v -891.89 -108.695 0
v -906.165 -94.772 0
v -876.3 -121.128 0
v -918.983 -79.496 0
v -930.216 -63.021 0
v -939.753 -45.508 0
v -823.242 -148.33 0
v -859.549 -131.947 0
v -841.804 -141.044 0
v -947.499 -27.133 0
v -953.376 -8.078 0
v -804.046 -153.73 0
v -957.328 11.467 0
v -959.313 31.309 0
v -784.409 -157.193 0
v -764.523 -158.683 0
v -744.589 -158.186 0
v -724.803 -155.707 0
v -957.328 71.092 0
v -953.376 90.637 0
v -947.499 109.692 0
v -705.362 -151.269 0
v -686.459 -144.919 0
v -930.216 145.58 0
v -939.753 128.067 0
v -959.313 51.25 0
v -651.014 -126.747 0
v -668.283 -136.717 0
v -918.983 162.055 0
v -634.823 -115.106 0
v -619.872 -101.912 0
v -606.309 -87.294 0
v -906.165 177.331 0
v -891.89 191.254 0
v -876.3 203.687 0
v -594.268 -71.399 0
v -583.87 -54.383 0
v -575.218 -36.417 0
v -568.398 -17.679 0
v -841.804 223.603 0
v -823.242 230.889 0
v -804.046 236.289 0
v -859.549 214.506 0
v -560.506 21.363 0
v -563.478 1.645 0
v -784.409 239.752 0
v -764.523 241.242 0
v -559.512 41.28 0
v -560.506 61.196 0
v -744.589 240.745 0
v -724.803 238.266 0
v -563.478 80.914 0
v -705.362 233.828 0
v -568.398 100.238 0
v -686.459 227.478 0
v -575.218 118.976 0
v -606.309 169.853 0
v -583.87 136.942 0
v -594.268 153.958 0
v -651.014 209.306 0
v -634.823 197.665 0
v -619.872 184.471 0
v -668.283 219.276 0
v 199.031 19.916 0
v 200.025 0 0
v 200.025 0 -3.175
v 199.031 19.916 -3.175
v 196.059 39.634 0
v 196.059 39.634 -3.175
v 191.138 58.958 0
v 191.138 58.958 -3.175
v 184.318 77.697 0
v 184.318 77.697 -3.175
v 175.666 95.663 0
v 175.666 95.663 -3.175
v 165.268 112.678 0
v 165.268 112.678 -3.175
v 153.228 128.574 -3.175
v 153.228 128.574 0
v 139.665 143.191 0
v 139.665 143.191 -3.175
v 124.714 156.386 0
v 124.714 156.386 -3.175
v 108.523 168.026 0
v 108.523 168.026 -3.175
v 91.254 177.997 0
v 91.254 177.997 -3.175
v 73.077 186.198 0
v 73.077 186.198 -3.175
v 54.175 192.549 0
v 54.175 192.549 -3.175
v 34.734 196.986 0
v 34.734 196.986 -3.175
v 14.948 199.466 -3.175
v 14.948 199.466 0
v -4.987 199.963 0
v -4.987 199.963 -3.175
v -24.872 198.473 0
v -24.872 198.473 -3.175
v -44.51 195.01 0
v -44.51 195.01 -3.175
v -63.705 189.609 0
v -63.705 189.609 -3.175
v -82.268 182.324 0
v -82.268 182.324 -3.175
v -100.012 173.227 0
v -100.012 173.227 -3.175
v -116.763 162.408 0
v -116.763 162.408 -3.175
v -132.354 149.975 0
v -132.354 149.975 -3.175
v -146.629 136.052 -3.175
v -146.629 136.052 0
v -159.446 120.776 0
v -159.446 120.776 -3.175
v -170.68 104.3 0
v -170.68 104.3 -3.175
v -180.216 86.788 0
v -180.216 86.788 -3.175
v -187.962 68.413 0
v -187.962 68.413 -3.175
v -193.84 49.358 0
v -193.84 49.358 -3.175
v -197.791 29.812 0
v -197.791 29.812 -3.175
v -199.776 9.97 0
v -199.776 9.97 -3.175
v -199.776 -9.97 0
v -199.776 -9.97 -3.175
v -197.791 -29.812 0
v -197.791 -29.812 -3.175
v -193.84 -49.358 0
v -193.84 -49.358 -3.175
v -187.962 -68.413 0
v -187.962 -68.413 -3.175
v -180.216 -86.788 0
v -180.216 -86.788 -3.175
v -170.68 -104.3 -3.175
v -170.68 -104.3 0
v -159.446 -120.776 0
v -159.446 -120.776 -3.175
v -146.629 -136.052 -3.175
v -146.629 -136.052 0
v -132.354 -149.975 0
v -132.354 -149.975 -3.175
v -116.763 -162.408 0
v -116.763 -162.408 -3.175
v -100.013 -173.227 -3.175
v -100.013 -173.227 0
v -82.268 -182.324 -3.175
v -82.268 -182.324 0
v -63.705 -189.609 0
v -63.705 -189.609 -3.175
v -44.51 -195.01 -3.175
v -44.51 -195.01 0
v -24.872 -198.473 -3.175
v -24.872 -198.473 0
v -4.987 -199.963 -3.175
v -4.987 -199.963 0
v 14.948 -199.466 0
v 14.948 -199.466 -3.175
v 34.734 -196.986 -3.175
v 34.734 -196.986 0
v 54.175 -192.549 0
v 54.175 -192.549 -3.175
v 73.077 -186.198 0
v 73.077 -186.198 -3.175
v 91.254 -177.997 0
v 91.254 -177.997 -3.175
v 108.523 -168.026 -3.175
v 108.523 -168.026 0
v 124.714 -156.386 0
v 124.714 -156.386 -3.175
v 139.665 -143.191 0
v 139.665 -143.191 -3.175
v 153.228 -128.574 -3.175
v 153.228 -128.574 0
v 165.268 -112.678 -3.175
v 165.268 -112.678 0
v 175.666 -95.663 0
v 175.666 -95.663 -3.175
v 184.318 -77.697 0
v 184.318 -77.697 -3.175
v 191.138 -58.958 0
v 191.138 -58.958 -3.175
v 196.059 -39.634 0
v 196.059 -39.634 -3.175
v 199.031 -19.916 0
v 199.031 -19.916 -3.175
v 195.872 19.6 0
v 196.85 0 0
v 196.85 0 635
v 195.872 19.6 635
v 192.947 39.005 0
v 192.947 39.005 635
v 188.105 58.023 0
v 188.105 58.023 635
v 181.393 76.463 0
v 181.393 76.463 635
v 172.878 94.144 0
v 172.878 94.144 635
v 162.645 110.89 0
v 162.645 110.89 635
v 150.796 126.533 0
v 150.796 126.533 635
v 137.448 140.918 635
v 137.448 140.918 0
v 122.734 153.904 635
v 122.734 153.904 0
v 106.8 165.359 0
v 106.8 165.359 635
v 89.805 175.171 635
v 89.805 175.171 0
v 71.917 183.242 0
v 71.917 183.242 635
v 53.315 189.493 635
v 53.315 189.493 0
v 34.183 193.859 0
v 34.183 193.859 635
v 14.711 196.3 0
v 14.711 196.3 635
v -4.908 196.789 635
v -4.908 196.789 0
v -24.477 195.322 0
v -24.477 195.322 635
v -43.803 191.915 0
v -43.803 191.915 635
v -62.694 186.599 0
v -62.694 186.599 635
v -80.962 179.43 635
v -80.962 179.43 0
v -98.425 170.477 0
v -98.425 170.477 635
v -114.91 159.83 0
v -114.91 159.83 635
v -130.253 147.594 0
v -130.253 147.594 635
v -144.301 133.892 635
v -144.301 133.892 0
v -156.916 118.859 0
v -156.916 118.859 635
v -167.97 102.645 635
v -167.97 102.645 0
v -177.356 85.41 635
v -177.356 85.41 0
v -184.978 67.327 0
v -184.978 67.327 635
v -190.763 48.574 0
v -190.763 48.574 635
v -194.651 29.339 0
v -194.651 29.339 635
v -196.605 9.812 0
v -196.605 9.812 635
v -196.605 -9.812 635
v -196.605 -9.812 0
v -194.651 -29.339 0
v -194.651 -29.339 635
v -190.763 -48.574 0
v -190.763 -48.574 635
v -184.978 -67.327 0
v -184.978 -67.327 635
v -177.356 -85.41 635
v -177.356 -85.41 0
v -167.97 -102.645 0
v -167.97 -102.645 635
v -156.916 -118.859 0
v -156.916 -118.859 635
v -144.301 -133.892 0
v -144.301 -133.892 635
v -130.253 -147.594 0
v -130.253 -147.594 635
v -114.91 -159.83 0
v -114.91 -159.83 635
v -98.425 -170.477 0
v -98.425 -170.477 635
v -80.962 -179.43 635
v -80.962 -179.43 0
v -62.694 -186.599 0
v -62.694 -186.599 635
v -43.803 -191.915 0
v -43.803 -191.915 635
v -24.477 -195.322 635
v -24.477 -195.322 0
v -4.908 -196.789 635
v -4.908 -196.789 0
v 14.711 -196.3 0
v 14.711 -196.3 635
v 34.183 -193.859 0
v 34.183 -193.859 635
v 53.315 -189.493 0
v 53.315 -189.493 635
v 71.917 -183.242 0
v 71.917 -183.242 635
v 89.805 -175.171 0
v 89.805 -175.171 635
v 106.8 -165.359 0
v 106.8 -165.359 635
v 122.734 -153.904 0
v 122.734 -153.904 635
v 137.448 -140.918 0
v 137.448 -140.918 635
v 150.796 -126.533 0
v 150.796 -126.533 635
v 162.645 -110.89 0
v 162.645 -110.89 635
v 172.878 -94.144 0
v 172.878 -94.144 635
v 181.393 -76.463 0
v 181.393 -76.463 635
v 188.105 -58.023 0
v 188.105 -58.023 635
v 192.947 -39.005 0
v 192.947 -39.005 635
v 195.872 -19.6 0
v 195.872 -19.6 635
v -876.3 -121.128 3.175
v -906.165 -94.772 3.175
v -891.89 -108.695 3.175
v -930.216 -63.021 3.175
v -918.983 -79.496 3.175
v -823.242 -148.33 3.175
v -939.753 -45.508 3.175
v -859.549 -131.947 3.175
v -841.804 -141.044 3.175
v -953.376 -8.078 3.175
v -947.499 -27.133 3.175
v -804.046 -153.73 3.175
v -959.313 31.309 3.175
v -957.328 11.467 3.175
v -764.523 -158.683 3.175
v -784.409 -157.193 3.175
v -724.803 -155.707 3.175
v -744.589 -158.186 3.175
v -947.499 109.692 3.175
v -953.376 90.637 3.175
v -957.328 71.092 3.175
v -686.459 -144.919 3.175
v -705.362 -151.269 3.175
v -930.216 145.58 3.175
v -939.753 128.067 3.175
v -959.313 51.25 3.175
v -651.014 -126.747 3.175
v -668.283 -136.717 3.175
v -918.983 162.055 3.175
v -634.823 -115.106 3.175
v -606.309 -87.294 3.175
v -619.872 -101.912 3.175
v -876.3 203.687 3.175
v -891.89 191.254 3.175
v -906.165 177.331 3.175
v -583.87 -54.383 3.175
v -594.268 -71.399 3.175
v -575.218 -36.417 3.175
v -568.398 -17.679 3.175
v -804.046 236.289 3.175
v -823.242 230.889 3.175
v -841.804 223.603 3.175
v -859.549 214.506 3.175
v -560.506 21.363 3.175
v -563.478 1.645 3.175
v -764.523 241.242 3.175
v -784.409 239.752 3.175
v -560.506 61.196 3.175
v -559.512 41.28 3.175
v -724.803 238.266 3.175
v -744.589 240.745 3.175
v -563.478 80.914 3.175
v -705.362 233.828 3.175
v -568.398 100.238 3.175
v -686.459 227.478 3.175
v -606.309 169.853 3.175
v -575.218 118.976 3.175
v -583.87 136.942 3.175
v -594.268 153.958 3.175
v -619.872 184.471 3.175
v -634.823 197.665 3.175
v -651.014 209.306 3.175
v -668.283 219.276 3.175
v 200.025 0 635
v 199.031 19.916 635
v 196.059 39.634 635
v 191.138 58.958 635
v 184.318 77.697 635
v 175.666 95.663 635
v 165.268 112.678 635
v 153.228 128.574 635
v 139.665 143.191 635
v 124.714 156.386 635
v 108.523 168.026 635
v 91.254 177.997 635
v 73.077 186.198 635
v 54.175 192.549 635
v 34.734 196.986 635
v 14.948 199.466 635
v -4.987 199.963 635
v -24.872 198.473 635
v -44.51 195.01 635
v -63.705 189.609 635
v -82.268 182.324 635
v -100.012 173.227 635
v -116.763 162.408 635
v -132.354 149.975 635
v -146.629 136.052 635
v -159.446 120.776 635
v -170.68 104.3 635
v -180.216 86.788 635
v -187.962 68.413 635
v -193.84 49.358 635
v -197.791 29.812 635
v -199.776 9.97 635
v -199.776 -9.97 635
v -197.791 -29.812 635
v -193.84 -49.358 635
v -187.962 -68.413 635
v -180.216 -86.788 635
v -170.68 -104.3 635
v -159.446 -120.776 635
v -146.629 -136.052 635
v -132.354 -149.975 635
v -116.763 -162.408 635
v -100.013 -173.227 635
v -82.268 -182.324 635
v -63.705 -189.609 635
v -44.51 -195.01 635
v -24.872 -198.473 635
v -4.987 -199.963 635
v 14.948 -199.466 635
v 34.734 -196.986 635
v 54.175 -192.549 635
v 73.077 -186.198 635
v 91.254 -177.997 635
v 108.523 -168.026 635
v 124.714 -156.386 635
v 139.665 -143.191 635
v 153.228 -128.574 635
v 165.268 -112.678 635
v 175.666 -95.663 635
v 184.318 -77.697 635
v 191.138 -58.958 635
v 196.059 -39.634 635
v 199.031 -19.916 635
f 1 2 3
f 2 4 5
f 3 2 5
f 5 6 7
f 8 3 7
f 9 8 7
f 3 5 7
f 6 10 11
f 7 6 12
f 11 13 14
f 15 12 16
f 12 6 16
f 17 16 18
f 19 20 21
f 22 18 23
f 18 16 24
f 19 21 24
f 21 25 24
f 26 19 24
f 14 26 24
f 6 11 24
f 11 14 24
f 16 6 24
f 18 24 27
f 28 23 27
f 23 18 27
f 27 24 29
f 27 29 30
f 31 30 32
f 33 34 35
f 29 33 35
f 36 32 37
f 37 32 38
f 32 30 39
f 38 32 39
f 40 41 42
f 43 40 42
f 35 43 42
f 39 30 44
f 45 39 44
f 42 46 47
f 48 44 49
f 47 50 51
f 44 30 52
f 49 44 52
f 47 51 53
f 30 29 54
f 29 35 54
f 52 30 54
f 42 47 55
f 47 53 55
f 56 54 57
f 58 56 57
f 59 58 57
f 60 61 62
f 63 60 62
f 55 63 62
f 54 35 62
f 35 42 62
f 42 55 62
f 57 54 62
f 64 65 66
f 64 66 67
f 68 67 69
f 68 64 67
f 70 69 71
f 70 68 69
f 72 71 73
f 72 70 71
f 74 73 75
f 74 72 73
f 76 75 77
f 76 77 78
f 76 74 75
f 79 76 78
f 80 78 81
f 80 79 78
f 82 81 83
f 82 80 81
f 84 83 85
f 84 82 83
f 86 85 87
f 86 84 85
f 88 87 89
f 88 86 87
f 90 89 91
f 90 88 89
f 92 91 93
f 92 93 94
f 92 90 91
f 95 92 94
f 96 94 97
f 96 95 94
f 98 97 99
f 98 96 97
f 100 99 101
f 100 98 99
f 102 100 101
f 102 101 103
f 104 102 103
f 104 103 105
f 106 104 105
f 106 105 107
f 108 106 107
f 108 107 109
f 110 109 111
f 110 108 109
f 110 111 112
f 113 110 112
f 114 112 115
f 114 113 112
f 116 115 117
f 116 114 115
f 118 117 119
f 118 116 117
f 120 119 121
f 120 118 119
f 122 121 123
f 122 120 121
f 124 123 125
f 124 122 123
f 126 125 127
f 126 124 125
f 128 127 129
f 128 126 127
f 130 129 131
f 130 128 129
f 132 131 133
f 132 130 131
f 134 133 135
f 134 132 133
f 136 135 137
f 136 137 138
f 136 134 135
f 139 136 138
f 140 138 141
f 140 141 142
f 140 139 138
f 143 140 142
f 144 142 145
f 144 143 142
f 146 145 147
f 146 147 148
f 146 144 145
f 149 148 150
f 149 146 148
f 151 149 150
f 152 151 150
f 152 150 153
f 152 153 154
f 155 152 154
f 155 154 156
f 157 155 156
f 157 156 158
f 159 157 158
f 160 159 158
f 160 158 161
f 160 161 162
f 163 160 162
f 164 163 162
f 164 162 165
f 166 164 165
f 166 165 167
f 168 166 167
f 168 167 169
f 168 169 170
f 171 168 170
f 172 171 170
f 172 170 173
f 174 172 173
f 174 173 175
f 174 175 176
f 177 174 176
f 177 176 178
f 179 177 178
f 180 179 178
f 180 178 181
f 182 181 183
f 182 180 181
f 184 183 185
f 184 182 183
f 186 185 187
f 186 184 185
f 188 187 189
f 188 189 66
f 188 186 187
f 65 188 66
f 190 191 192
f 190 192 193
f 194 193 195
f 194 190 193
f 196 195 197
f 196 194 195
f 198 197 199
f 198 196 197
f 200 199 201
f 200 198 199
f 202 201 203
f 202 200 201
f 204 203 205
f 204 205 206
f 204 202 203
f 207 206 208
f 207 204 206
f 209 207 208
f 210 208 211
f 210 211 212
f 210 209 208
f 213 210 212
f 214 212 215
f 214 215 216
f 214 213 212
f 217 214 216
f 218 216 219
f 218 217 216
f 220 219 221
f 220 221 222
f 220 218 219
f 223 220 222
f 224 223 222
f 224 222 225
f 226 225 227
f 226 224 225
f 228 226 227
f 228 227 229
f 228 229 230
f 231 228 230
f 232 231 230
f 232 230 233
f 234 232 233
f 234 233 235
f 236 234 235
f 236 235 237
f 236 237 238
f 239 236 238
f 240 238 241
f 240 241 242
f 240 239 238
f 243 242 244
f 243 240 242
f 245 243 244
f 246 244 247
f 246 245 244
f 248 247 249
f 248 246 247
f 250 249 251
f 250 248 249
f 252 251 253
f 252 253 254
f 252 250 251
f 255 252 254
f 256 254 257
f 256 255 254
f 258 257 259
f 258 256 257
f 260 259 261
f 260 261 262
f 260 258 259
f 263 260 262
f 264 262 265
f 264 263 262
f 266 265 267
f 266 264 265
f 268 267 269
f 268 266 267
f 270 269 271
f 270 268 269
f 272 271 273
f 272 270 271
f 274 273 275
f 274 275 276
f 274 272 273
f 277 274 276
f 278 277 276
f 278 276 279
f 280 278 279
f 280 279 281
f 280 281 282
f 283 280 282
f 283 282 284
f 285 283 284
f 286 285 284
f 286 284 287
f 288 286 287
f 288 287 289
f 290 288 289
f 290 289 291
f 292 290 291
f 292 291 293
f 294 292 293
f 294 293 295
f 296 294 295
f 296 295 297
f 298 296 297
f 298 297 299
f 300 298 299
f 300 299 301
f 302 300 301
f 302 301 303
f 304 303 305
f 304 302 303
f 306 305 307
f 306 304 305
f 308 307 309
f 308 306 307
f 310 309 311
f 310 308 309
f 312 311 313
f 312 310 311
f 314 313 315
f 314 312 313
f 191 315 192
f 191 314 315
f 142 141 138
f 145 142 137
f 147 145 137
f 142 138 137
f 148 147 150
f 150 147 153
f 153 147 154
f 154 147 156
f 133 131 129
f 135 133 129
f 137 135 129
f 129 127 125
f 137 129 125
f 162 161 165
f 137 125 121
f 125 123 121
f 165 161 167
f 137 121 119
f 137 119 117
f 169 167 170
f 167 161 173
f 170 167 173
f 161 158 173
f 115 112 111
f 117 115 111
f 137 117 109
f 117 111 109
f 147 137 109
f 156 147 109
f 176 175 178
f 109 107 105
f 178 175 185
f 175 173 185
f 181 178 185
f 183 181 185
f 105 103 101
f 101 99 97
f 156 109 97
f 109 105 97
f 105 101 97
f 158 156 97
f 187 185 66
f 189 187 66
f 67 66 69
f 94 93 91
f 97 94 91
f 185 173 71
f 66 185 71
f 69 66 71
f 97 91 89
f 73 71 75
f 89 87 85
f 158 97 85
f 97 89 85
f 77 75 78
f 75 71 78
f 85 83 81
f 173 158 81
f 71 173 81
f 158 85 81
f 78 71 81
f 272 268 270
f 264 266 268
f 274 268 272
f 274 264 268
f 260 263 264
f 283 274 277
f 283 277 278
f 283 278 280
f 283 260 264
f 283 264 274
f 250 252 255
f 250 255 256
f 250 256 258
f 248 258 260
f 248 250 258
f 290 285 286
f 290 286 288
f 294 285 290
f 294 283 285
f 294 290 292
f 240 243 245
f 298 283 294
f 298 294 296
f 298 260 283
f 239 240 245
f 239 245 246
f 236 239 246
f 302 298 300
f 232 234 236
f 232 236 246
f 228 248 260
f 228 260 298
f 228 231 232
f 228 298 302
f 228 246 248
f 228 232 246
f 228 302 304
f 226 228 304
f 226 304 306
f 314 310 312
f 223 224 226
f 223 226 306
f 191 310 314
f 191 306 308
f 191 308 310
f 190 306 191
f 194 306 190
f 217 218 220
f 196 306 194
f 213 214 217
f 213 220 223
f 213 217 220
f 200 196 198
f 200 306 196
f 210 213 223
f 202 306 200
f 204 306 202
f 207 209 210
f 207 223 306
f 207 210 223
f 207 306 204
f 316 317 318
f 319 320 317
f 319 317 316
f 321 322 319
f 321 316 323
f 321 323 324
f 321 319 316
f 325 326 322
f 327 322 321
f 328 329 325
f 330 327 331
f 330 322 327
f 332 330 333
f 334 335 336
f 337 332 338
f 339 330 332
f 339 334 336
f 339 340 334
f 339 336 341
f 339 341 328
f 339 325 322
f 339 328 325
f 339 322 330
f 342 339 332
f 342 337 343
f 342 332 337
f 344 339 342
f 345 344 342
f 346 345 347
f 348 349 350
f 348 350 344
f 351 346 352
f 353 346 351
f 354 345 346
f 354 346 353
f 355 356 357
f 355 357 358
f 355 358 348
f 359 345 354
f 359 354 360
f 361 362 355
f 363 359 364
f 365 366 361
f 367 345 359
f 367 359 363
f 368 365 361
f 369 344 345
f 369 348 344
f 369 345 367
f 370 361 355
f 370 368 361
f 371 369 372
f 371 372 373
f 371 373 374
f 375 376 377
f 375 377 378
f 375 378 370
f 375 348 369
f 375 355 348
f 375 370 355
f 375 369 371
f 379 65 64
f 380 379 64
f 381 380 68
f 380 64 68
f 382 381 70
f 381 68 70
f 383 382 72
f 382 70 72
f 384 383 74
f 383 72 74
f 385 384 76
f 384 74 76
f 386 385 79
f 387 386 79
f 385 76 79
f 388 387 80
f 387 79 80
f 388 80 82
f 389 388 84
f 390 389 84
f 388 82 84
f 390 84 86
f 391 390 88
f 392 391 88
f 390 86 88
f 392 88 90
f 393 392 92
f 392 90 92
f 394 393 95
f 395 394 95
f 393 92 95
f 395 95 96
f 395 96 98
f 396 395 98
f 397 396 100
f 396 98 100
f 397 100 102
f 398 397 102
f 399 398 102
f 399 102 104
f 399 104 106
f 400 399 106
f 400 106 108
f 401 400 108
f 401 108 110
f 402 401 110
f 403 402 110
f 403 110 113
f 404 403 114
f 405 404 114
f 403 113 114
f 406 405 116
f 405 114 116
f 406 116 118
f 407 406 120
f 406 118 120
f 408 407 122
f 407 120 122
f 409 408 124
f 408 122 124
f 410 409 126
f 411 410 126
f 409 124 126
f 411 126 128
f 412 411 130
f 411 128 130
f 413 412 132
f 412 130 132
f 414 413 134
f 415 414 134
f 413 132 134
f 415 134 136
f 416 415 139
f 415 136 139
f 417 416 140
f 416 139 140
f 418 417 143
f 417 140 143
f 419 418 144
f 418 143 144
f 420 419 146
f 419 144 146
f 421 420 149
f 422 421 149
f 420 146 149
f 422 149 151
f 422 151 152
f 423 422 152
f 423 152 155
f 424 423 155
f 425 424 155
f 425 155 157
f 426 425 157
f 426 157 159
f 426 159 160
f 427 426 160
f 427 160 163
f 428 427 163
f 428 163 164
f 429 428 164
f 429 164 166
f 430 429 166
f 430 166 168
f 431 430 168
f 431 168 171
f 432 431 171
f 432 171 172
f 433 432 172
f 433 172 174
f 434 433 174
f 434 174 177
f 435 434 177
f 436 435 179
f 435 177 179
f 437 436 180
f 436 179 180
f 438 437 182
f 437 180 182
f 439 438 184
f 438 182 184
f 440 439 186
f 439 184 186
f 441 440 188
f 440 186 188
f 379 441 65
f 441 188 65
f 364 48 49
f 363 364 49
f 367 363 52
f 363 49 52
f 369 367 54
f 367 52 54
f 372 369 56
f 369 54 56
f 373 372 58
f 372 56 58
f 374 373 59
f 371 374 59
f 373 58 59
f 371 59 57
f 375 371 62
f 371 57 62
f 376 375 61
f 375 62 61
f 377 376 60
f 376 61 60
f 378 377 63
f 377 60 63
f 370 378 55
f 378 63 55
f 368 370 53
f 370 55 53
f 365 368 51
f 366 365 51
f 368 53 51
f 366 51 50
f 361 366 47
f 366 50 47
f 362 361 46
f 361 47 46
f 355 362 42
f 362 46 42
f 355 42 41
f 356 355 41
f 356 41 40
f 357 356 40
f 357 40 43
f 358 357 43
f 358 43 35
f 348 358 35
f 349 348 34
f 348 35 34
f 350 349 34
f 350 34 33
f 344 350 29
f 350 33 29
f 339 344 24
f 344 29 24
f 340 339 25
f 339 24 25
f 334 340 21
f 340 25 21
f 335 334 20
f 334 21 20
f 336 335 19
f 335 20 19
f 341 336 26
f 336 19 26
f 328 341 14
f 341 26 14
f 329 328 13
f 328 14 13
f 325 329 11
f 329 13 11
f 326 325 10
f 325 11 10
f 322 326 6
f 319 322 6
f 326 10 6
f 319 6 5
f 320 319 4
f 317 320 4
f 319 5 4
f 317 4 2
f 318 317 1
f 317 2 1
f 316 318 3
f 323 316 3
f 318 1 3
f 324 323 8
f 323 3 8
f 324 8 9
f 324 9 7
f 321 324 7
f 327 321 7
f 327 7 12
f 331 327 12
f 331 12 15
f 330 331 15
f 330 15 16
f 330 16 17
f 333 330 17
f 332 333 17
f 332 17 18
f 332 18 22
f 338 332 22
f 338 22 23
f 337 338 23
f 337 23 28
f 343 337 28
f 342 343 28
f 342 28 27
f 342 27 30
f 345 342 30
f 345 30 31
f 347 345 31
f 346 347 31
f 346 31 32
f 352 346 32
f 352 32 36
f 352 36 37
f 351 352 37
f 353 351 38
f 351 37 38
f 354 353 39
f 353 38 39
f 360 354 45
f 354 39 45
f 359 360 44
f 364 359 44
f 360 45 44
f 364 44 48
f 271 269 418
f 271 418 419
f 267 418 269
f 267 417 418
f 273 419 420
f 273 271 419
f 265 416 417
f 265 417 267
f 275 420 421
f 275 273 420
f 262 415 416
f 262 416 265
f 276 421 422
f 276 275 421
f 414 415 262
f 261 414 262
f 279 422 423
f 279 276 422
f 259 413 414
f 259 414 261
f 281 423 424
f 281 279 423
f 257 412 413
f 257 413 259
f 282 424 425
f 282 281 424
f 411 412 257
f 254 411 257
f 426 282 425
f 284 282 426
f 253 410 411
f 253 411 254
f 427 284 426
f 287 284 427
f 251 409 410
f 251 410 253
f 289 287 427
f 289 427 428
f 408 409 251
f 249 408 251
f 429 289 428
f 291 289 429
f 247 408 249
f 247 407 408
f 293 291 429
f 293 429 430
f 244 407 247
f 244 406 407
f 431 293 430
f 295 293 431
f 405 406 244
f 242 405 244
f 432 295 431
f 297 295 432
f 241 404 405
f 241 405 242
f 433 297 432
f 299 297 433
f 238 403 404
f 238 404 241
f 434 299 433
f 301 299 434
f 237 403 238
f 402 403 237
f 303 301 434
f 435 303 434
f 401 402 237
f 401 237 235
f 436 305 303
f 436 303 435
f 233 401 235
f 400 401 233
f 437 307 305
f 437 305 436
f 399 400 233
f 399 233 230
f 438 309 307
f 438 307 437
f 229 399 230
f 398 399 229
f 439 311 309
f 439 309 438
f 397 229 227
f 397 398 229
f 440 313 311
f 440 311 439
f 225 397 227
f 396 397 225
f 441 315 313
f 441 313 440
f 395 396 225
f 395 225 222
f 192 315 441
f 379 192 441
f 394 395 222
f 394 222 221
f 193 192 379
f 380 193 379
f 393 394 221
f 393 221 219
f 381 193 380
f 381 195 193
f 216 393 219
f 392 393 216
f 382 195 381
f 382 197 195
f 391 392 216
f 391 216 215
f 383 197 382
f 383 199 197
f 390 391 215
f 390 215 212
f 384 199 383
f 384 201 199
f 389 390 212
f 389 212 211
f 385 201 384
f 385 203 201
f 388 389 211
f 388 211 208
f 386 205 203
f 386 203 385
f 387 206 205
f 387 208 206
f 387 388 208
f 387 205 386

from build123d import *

# Parameters (mm, degrees)
F0_R     = 200.025
F1_DEPTH = 3.175
F2_R     = 200.025
F2_R_2   = 196.85
F3_DEPTH = 635
F4_R     = 200.025
F5_DEPTH = 3.175


with BuildPart() as f1:
    # F0 (on Top) → F1 (new body)
    with BuildSketch(Plane.XY):
        Circle(F0_R)
    extrude(amount=-F1_DEPTH)

    # F2 (on face) → F3 (join)
    with BuildSketch(Plane.XY):
        Circle(F2_R)
        Circle(F2_R_2, mode=Mode.SUBTRACT)
    extrude(amount=F3_DEPTH)


with BuildPart() as f5:
    # F4 (on Top) → F5 (new body)
    with BuildSketch(Plane.XY):
        with Locations((-759.536684, 41.279506)):
            Circle(F4_R)
    extrude(amount=F5_DEPTH)


solid = Compound([f1.part, f5.part])
